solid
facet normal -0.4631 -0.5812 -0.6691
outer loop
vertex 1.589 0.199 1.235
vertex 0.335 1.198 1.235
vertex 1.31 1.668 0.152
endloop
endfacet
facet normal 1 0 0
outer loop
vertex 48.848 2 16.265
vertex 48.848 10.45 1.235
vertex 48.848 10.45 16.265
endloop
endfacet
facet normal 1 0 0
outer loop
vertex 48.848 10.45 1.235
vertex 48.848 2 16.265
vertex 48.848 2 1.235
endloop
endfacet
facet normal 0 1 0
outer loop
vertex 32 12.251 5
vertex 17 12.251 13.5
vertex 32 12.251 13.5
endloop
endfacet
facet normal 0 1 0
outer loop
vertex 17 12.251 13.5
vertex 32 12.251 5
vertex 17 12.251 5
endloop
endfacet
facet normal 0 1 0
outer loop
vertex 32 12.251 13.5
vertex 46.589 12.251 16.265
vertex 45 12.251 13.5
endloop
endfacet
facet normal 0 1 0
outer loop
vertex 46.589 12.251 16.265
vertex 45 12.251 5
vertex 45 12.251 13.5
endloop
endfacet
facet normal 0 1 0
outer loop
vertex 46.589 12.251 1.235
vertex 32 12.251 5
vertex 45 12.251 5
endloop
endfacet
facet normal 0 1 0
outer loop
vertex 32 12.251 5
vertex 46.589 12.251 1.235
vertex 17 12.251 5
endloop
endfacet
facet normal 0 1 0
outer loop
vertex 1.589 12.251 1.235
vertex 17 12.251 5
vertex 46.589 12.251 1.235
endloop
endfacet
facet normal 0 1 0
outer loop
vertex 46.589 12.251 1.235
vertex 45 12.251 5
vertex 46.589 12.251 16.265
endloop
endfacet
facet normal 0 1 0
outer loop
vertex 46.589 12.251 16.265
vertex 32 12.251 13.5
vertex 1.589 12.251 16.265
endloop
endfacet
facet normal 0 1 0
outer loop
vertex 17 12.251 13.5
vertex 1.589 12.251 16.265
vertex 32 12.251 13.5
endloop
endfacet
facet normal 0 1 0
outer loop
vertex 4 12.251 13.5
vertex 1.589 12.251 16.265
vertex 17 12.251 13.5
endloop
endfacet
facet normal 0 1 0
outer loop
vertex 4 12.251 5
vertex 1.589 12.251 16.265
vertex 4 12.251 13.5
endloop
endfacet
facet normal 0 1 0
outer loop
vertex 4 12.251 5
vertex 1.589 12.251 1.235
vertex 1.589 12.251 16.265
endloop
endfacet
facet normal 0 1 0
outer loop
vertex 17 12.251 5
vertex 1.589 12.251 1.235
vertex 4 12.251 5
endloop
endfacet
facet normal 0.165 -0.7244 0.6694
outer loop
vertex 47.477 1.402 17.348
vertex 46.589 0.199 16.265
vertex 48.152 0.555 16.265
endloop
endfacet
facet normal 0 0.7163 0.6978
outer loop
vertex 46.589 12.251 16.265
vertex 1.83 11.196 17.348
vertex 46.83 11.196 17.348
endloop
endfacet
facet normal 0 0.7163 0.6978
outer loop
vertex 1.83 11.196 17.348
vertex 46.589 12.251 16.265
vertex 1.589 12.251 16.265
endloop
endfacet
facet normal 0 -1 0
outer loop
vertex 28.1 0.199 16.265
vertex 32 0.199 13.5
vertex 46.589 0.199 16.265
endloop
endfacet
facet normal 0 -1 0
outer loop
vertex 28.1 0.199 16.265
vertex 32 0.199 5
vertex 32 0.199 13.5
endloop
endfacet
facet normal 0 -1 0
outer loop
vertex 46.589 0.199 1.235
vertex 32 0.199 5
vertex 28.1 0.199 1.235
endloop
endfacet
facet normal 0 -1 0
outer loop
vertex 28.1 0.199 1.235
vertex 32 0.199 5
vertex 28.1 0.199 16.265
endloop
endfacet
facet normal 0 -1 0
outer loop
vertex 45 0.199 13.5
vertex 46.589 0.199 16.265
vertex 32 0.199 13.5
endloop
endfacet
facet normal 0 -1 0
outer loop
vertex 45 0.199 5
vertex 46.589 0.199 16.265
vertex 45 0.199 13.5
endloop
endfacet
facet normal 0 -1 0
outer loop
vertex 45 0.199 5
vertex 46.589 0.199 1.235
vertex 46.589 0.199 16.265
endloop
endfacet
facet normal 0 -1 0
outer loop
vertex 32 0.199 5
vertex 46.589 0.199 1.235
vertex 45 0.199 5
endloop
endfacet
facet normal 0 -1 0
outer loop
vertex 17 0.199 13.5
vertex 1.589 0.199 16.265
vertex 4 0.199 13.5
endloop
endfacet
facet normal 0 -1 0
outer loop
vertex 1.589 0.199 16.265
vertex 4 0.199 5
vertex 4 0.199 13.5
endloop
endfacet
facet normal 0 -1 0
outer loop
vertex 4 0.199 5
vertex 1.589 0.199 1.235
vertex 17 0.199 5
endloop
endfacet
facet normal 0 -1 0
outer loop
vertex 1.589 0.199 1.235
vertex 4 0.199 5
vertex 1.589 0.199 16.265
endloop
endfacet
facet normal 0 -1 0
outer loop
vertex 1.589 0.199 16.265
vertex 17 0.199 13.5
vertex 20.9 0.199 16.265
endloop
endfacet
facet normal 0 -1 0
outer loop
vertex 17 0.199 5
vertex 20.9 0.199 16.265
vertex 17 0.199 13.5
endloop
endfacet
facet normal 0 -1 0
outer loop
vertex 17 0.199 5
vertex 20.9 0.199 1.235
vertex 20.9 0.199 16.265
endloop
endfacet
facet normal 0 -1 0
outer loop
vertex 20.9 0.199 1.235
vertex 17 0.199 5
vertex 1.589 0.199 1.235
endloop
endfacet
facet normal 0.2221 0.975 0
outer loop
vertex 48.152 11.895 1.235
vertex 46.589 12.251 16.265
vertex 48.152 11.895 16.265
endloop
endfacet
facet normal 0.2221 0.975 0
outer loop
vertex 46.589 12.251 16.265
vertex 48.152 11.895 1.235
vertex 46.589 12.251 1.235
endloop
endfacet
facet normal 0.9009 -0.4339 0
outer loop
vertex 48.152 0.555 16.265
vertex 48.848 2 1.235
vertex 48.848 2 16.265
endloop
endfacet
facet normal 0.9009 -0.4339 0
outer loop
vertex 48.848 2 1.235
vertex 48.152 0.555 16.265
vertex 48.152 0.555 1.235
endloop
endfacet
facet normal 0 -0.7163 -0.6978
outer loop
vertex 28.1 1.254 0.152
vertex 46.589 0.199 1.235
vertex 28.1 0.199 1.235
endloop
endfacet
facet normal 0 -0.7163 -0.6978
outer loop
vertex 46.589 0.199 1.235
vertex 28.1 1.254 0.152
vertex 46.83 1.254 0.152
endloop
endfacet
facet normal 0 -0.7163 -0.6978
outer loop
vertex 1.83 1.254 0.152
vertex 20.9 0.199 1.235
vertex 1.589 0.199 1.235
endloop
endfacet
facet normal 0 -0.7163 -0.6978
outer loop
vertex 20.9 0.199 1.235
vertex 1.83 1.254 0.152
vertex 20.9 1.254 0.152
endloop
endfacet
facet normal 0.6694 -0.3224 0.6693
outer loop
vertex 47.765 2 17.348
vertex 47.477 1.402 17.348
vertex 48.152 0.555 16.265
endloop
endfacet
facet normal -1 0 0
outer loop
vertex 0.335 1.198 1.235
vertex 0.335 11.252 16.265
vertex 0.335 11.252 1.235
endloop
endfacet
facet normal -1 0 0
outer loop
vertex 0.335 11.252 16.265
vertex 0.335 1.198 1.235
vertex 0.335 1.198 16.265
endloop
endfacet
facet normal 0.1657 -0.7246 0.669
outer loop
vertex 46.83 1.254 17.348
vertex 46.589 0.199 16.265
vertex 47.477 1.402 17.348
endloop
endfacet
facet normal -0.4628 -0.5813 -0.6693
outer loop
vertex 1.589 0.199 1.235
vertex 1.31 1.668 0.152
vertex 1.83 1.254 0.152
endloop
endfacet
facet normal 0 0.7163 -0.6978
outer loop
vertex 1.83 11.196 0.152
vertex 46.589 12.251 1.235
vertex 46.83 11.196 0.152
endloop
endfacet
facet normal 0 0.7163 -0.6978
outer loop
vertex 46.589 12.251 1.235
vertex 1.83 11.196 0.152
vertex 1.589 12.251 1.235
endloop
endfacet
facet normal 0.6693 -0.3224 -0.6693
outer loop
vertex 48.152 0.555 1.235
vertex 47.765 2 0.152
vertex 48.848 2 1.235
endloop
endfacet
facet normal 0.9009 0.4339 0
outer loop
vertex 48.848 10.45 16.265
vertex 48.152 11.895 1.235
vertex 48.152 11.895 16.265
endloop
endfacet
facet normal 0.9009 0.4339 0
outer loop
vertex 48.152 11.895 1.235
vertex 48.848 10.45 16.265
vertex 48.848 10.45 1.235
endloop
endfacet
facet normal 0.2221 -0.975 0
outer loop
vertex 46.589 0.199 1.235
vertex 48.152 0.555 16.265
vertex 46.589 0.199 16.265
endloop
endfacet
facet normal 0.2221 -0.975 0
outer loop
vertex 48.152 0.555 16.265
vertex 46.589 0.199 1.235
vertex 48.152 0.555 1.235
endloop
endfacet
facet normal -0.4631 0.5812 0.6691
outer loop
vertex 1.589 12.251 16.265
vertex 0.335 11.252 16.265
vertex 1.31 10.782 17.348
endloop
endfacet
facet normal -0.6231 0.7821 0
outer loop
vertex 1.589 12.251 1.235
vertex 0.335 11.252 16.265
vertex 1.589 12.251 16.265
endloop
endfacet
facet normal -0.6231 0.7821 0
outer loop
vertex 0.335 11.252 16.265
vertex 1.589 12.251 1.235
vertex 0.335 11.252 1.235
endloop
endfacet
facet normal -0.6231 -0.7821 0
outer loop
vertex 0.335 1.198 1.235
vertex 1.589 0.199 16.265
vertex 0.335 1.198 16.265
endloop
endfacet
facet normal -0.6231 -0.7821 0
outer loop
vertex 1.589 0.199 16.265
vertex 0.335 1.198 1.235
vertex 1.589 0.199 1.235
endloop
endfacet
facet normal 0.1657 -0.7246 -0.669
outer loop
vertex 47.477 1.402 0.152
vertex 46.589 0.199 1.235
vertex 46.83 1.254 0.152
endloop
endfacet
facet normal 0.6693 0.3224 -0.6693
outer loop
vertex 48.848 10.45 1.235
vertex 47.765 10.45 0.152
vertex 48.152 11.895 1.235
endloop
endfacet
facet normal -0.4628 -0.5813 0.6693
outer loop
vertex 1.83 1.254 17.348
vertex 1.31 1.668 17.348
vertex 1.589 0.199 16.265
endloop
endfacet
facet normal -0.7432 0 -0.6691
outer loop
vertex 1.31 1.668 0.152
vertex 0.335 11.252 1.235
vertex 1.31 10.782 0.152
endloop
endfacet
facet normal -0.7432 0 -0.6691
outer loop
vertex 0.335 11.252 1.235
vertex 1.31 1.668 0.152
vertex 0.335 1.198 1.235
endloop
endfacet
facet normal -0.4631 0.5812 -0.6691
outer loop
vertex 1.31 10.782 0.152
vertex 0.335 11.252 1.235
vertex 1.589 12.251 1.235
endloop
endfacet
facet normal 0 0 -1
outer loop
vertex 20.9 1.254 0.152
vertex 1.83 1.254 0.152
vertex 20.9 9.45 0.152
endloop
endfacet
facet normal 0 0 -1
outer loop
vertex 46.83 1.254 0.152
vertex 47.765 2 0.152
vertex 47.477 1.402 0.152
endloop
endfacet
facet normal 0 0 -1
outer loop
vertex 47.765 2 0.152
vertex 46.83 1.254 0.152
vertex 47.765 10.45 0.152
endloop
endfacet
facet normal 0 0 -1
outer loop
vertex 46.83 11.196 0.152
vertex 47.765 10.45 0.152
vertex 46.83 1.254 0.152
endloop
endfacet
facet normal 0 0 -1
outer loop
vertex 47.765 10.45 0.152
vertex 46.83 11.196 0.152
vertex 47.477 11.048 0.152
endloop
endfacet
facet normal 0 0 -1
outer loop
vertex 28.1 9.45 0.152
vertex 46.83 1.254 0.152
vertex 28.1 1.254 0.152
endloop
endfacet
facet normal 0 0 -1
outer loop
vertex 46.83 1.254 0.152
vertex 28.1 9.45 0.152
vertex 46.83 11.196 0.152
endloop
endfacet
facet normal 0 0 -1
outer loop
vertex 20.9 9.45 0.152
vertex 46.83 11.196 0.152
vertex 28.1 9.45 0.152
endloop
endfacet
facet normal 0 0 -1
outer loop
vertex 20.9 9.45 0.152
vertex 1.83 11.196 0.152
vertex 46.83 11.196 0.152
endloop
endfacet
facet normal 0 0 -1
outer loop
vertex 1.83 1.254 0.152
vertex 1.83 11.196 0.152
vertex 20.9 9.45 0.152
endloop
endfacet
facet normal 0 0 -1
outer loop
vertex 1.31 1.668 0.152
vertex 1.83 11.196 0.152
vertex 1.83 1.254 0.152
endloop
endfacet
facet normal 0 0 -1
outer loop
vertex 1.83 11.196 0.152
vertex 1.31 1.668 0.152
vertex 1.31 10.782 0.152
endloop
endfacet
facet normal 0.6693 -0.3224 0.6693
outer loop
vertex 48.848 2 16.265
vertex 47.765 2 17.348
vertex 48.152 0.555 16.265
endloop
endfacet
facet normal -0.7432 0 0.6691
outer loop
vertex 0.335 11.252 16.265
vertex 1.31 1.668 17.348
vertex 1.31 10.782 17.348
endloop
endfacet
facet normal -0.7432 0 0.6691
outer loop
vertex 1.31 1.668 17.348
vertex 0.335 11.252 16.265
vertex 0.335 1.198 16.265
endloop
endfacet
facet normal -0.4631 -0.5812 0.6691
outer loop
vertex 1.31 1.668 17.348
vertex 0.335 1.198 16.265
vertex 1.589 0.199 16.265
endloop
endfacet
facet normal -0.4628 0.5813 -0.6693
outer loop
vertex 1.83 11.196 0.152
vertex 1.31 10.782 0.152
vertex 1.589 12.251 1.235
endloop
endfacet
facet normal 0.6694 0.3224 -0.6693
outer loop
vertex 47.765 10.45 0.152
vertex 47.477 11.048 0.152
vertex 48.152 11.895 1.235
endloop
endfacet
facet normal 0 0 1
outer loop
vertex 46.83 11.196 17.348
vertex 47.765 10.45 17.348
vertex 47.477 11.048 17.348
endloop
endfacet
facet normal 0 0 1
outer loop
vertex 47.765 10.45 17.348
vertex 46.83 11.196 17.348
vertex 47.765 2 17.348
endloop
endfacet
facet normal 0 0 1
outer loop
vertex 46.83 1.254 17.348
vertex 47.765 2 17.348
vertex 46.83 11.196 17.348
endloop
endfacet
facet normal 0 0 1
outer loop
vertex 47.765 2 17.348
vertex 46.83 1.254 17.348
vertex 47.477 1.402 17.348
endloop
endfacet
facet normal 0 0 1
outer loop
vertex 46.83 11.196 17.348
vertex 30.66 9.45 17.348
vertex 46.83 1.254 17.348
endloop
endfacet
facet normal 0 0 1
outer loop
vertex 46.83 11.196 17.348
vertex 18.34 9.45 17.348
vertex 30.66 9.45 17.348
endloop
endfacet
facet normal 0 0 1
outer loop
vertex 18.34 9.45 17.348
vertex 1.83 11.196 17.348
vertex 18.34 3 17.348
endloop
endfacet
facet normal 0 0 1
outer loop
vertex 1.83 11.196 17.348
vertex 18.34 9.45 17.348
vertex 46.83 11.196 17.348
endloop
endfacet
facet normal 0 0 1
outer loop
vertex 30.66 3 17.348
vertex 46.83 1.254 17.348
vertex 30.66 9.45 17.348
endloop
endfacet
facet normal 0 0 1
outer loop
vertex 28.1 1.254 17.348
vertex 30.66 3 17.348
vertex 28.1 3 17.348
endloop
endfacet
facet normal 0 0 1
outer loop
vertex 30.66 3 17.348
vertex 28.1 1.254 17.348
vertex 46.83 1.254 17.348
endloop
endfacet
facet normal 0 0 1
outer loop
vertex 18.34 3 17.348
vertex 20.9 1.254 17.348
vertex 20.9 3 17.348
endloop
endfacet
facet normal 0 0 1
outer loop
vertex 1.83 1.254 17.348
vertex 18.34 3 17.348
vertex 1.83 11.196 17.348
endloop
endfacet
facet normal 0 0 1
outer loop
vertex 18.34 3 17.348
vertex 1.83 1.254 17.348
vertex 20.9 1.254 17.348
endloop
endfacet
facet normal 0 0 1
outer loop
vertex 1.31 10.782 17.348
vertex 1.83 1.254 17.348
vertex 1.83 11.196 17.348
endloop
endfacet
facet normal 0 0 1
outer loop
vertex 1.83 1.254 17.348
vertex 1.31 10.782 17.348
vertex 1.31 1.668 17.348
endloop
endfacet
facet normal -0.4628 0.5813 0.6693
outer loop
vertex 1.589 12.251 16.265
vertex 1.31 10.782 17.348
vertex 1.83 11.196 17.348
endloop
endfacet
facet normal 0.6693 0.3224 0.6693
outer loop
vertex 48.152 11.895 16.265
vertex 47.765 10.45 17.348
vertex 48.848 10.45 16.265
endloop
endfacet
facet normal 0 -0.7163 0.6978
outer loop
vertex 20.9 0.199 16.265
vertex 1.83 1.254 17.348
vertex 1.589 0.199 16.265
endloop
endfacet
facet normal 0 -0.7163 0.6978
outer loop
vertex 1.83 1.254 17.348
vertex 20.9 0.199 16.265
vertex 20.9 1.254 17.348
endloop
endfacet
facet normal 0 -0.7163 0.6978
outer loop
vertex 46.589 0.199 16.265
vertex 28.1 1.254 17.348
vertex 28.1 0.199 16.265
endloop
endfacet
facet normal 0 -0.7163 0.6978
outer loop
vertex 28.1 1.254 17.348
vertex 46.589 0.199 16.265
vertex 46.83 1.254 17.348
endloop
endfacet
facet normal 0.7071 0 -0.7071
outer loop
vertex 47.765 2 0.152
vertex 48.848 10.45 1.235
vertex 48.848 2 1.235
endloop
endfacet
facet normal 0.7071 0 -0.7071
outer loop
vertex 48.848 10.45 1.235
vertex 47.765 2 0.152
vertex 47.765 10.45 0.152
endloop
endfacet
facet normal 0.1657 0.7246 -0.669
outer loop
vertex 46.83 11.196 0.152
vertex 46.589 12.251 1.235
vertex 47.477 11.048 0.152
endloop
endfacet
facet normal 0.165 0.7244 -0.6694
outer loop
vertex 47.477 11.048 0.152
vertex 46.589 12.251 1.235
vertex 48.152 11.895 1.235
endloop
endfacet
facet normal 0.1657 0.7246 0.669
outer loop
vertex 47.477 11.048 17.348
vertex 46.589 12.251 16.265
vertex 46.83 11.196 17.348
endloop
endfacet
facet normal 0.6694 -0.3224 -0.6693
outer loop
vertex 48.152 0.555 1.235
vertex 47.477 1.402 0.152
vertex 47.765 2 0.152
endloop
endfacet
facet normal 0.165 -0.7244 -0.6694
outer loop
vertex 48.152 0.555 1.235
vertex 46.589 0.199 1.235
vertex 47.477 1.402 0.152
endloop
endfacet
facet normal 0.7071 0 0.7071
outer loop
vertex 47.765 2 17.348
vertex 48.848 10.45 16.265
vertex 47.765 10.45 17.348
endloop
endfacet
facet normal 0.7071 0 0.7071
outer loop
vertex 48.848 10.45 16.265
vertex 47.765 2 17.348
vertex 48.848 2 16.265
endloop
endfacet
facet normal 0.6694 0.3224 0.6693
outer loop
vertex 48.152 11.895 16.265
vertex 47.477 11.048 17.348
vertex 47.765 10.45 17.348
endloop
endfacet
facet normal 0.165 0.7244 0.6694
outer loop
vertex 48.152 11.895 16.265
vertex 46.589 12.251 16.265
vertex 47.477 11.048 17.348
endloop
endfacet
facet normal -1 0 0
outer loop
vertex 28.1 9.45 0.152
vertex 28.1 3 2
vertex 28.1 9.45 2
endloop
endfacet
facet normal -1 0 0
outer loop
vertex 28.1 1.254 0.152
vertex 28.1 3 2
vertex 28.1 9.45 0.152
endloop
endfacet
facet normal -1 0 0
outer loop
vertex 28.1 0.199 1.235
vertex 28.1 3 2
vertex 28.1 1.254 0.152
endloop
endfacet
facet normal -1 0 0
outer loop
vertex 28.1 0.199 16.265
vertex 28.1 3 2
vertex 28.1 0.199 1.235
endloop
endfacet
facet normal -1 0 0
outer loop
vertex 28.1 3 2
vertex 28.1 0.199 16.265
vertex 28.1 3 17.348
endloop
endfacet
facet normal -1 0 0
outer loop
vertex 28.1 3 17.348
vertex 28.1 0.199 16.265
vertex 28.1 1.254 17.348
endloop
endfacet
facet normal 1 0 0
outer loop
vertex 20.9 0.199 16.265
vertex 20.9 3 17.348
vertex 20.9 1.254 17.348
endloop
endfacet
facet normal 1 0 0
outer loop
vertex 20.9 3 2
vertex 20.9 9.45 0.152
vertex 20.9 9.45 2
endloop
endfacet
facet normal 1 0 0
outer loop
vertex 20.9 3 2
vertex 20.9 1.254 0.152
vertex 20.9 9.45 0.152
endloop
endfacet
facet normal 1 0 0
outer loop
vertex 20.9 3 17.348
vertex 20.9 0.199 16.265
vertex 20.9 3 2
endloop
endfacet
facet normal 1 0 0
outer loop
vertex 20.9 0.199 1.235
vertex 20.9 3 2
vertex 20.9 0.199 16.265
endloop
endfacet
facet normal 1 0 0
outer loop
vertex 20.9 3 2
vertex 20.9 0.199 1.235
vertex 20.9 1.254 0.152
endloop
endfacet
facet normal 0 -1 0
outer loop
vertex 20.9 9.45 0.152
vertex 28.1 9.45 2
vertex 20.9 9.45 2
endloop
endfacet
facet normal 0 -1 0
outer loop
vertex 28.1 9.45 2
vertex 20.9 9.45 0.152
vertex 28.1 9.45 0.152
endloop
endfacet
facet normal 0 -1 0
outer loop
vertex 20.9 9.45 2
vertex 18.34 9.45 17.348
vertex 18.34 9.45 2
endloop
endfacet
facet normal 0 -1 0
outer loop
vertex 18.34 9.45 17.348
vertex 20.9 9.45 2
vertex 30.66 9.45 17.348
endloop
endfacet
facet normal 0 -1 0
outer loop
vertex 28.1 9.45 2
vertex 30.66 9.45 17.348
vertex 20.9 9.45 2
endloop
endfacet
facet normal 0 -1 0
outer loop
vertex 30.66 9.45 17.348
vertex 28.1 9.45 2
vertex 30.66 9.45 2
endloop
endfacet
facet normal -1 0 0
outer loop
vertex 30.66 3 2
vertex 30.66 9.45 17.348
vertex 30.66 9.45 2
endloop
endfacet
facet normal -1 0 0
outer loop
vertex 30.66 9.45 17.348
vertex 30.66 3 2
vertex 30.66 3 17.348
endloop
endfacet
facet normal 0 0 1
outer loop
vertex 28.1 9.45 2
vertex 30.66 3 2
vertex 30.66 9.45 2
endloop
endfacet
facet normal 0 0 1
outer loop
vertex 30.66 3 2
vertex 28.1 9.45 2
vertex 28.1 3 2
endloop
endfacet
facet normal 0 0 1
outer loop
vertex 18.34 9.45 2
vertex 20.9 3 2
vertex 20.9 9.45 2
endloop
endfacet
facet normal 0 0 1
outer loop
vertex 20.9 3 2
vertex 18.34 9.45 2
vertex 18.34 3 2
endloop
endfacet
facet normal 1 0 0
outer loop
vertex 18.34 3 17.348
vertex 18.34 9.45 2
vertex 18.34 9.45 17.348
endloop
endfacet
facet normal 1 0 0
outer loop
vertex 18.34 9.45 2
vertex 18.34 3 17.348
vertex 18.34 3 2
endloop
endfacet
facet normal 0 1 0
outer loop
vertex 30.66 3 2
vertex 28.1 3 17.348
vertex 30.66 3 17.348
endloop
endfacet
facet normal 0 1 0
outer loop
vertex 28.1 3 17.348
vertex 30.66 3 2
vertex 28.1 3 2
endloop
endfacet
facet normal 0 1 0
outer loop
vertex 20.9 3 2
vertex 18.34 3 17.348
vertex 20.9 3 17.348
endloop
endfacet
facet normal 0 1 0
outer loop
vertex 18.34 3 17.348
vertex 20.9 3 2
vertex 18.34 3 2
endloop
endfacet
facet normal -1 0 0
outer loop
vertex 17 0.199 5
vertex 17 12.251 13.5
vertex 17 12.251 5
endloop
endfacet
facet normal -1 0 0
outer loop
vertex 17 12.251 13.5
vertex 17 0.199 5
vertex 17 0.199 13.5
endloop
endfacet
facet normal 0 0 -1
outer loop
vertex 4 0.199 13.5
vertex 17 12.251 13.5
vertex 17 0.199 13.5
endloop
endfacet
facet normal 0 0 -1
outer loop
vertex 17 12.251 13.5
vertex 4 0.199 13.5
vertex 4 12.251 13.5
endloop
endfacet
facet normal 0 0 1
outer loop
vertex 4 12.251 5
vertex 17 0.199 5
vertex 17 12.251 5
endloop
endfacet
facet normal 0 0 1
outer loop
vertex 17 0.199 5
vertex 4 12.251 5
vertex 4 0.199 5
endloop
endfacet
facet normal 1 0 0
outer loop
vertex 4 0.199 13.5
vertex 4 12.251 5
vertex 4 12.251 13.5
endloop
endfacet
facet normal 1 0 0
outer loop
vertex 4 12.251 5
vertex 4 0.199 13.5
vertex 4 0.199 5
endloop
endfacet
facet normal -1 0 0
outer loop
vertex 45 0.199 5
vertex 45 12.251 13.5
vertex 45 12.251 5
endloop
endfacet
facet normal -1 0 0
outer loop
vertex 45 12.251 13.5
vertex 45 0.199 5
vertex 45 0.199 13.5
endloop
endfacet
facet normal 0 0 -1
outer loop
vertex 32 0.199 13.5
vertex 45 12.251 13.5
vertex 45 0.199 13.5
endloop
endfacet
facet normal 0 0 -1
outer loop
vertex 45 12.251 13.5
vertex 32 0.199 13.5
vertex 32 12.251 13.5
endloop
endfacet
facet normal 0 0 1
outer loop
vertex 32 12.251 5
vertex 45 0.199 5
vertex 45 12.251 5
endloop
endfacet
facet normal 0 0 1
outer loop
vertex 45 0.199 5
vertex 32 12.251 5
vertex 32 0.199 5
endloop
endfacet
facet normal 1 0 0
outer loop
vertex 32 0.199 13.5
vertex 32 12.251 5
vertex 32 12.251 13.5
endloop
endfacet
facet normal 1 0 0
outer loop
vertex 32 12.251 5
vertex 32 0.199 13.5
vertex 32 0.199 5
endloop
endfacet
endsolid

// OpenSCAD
// dock adapter to hold charging cable on 
// phone mount.

// parameters
plug_width = 12.32; // mm
plug_depth = 6.45; // mm

below_plug = 2; // mm
cable_width = 7.2; // mm
plug_back_depth = 3; // mm

peg_width = 13.0; // mm
peg_height = 8.5; // mm
peg_distance = 15.0; // mm between inside of pegs

extra_height = 1; // mm
around_peg = 4; // mm
rounding = 2; // mm

main_width = around_peg * 2 + peg_width * 2 + peg_distance;
main_depth = plug_depth + plug_back_depth * 2;
main_height = peg_height + around_peg * 2 + extra_height;


difference() {
    // main body
    translate([rounding, rounding, rounding]) {
        minkowski() {
            cube([
                main_width - rounding * 2,
                main_depth - rounding * 2,
                main_height - rounding *2
            ]);
            sphere(rounding);
        }
    }

    // cable slot
    translate([
        (main_width - cable_width) / 2,
        0,
        0
    ]) {
        cube([
            cable_width,
            main_depth - plug_back_depth,
            main_height
        ]);
    }

    // plug slot
    translate([
        (main_width - plug_width) / 2,
        plug_back_depth,
        below_plug
    ]) {
        cube([
            plug_width,
            plug_depth,
            main_height - below_plug
        ]);
    }

    // left peg
    translate([
        around_peg,
        0,
        main_height - around_peg - peg_height
    ]) {
        cube([
            peg_width,
            main_depth,
            peg_height
        ]);
    }


    // right peg
    translate([
        main_width - peg_width - around_peg,
        0,
        main_height - around_peg - peg_height
    ]) {
        cube([
            peg_width,
            main_depth,
            peg_height
        ]);
    }
}
